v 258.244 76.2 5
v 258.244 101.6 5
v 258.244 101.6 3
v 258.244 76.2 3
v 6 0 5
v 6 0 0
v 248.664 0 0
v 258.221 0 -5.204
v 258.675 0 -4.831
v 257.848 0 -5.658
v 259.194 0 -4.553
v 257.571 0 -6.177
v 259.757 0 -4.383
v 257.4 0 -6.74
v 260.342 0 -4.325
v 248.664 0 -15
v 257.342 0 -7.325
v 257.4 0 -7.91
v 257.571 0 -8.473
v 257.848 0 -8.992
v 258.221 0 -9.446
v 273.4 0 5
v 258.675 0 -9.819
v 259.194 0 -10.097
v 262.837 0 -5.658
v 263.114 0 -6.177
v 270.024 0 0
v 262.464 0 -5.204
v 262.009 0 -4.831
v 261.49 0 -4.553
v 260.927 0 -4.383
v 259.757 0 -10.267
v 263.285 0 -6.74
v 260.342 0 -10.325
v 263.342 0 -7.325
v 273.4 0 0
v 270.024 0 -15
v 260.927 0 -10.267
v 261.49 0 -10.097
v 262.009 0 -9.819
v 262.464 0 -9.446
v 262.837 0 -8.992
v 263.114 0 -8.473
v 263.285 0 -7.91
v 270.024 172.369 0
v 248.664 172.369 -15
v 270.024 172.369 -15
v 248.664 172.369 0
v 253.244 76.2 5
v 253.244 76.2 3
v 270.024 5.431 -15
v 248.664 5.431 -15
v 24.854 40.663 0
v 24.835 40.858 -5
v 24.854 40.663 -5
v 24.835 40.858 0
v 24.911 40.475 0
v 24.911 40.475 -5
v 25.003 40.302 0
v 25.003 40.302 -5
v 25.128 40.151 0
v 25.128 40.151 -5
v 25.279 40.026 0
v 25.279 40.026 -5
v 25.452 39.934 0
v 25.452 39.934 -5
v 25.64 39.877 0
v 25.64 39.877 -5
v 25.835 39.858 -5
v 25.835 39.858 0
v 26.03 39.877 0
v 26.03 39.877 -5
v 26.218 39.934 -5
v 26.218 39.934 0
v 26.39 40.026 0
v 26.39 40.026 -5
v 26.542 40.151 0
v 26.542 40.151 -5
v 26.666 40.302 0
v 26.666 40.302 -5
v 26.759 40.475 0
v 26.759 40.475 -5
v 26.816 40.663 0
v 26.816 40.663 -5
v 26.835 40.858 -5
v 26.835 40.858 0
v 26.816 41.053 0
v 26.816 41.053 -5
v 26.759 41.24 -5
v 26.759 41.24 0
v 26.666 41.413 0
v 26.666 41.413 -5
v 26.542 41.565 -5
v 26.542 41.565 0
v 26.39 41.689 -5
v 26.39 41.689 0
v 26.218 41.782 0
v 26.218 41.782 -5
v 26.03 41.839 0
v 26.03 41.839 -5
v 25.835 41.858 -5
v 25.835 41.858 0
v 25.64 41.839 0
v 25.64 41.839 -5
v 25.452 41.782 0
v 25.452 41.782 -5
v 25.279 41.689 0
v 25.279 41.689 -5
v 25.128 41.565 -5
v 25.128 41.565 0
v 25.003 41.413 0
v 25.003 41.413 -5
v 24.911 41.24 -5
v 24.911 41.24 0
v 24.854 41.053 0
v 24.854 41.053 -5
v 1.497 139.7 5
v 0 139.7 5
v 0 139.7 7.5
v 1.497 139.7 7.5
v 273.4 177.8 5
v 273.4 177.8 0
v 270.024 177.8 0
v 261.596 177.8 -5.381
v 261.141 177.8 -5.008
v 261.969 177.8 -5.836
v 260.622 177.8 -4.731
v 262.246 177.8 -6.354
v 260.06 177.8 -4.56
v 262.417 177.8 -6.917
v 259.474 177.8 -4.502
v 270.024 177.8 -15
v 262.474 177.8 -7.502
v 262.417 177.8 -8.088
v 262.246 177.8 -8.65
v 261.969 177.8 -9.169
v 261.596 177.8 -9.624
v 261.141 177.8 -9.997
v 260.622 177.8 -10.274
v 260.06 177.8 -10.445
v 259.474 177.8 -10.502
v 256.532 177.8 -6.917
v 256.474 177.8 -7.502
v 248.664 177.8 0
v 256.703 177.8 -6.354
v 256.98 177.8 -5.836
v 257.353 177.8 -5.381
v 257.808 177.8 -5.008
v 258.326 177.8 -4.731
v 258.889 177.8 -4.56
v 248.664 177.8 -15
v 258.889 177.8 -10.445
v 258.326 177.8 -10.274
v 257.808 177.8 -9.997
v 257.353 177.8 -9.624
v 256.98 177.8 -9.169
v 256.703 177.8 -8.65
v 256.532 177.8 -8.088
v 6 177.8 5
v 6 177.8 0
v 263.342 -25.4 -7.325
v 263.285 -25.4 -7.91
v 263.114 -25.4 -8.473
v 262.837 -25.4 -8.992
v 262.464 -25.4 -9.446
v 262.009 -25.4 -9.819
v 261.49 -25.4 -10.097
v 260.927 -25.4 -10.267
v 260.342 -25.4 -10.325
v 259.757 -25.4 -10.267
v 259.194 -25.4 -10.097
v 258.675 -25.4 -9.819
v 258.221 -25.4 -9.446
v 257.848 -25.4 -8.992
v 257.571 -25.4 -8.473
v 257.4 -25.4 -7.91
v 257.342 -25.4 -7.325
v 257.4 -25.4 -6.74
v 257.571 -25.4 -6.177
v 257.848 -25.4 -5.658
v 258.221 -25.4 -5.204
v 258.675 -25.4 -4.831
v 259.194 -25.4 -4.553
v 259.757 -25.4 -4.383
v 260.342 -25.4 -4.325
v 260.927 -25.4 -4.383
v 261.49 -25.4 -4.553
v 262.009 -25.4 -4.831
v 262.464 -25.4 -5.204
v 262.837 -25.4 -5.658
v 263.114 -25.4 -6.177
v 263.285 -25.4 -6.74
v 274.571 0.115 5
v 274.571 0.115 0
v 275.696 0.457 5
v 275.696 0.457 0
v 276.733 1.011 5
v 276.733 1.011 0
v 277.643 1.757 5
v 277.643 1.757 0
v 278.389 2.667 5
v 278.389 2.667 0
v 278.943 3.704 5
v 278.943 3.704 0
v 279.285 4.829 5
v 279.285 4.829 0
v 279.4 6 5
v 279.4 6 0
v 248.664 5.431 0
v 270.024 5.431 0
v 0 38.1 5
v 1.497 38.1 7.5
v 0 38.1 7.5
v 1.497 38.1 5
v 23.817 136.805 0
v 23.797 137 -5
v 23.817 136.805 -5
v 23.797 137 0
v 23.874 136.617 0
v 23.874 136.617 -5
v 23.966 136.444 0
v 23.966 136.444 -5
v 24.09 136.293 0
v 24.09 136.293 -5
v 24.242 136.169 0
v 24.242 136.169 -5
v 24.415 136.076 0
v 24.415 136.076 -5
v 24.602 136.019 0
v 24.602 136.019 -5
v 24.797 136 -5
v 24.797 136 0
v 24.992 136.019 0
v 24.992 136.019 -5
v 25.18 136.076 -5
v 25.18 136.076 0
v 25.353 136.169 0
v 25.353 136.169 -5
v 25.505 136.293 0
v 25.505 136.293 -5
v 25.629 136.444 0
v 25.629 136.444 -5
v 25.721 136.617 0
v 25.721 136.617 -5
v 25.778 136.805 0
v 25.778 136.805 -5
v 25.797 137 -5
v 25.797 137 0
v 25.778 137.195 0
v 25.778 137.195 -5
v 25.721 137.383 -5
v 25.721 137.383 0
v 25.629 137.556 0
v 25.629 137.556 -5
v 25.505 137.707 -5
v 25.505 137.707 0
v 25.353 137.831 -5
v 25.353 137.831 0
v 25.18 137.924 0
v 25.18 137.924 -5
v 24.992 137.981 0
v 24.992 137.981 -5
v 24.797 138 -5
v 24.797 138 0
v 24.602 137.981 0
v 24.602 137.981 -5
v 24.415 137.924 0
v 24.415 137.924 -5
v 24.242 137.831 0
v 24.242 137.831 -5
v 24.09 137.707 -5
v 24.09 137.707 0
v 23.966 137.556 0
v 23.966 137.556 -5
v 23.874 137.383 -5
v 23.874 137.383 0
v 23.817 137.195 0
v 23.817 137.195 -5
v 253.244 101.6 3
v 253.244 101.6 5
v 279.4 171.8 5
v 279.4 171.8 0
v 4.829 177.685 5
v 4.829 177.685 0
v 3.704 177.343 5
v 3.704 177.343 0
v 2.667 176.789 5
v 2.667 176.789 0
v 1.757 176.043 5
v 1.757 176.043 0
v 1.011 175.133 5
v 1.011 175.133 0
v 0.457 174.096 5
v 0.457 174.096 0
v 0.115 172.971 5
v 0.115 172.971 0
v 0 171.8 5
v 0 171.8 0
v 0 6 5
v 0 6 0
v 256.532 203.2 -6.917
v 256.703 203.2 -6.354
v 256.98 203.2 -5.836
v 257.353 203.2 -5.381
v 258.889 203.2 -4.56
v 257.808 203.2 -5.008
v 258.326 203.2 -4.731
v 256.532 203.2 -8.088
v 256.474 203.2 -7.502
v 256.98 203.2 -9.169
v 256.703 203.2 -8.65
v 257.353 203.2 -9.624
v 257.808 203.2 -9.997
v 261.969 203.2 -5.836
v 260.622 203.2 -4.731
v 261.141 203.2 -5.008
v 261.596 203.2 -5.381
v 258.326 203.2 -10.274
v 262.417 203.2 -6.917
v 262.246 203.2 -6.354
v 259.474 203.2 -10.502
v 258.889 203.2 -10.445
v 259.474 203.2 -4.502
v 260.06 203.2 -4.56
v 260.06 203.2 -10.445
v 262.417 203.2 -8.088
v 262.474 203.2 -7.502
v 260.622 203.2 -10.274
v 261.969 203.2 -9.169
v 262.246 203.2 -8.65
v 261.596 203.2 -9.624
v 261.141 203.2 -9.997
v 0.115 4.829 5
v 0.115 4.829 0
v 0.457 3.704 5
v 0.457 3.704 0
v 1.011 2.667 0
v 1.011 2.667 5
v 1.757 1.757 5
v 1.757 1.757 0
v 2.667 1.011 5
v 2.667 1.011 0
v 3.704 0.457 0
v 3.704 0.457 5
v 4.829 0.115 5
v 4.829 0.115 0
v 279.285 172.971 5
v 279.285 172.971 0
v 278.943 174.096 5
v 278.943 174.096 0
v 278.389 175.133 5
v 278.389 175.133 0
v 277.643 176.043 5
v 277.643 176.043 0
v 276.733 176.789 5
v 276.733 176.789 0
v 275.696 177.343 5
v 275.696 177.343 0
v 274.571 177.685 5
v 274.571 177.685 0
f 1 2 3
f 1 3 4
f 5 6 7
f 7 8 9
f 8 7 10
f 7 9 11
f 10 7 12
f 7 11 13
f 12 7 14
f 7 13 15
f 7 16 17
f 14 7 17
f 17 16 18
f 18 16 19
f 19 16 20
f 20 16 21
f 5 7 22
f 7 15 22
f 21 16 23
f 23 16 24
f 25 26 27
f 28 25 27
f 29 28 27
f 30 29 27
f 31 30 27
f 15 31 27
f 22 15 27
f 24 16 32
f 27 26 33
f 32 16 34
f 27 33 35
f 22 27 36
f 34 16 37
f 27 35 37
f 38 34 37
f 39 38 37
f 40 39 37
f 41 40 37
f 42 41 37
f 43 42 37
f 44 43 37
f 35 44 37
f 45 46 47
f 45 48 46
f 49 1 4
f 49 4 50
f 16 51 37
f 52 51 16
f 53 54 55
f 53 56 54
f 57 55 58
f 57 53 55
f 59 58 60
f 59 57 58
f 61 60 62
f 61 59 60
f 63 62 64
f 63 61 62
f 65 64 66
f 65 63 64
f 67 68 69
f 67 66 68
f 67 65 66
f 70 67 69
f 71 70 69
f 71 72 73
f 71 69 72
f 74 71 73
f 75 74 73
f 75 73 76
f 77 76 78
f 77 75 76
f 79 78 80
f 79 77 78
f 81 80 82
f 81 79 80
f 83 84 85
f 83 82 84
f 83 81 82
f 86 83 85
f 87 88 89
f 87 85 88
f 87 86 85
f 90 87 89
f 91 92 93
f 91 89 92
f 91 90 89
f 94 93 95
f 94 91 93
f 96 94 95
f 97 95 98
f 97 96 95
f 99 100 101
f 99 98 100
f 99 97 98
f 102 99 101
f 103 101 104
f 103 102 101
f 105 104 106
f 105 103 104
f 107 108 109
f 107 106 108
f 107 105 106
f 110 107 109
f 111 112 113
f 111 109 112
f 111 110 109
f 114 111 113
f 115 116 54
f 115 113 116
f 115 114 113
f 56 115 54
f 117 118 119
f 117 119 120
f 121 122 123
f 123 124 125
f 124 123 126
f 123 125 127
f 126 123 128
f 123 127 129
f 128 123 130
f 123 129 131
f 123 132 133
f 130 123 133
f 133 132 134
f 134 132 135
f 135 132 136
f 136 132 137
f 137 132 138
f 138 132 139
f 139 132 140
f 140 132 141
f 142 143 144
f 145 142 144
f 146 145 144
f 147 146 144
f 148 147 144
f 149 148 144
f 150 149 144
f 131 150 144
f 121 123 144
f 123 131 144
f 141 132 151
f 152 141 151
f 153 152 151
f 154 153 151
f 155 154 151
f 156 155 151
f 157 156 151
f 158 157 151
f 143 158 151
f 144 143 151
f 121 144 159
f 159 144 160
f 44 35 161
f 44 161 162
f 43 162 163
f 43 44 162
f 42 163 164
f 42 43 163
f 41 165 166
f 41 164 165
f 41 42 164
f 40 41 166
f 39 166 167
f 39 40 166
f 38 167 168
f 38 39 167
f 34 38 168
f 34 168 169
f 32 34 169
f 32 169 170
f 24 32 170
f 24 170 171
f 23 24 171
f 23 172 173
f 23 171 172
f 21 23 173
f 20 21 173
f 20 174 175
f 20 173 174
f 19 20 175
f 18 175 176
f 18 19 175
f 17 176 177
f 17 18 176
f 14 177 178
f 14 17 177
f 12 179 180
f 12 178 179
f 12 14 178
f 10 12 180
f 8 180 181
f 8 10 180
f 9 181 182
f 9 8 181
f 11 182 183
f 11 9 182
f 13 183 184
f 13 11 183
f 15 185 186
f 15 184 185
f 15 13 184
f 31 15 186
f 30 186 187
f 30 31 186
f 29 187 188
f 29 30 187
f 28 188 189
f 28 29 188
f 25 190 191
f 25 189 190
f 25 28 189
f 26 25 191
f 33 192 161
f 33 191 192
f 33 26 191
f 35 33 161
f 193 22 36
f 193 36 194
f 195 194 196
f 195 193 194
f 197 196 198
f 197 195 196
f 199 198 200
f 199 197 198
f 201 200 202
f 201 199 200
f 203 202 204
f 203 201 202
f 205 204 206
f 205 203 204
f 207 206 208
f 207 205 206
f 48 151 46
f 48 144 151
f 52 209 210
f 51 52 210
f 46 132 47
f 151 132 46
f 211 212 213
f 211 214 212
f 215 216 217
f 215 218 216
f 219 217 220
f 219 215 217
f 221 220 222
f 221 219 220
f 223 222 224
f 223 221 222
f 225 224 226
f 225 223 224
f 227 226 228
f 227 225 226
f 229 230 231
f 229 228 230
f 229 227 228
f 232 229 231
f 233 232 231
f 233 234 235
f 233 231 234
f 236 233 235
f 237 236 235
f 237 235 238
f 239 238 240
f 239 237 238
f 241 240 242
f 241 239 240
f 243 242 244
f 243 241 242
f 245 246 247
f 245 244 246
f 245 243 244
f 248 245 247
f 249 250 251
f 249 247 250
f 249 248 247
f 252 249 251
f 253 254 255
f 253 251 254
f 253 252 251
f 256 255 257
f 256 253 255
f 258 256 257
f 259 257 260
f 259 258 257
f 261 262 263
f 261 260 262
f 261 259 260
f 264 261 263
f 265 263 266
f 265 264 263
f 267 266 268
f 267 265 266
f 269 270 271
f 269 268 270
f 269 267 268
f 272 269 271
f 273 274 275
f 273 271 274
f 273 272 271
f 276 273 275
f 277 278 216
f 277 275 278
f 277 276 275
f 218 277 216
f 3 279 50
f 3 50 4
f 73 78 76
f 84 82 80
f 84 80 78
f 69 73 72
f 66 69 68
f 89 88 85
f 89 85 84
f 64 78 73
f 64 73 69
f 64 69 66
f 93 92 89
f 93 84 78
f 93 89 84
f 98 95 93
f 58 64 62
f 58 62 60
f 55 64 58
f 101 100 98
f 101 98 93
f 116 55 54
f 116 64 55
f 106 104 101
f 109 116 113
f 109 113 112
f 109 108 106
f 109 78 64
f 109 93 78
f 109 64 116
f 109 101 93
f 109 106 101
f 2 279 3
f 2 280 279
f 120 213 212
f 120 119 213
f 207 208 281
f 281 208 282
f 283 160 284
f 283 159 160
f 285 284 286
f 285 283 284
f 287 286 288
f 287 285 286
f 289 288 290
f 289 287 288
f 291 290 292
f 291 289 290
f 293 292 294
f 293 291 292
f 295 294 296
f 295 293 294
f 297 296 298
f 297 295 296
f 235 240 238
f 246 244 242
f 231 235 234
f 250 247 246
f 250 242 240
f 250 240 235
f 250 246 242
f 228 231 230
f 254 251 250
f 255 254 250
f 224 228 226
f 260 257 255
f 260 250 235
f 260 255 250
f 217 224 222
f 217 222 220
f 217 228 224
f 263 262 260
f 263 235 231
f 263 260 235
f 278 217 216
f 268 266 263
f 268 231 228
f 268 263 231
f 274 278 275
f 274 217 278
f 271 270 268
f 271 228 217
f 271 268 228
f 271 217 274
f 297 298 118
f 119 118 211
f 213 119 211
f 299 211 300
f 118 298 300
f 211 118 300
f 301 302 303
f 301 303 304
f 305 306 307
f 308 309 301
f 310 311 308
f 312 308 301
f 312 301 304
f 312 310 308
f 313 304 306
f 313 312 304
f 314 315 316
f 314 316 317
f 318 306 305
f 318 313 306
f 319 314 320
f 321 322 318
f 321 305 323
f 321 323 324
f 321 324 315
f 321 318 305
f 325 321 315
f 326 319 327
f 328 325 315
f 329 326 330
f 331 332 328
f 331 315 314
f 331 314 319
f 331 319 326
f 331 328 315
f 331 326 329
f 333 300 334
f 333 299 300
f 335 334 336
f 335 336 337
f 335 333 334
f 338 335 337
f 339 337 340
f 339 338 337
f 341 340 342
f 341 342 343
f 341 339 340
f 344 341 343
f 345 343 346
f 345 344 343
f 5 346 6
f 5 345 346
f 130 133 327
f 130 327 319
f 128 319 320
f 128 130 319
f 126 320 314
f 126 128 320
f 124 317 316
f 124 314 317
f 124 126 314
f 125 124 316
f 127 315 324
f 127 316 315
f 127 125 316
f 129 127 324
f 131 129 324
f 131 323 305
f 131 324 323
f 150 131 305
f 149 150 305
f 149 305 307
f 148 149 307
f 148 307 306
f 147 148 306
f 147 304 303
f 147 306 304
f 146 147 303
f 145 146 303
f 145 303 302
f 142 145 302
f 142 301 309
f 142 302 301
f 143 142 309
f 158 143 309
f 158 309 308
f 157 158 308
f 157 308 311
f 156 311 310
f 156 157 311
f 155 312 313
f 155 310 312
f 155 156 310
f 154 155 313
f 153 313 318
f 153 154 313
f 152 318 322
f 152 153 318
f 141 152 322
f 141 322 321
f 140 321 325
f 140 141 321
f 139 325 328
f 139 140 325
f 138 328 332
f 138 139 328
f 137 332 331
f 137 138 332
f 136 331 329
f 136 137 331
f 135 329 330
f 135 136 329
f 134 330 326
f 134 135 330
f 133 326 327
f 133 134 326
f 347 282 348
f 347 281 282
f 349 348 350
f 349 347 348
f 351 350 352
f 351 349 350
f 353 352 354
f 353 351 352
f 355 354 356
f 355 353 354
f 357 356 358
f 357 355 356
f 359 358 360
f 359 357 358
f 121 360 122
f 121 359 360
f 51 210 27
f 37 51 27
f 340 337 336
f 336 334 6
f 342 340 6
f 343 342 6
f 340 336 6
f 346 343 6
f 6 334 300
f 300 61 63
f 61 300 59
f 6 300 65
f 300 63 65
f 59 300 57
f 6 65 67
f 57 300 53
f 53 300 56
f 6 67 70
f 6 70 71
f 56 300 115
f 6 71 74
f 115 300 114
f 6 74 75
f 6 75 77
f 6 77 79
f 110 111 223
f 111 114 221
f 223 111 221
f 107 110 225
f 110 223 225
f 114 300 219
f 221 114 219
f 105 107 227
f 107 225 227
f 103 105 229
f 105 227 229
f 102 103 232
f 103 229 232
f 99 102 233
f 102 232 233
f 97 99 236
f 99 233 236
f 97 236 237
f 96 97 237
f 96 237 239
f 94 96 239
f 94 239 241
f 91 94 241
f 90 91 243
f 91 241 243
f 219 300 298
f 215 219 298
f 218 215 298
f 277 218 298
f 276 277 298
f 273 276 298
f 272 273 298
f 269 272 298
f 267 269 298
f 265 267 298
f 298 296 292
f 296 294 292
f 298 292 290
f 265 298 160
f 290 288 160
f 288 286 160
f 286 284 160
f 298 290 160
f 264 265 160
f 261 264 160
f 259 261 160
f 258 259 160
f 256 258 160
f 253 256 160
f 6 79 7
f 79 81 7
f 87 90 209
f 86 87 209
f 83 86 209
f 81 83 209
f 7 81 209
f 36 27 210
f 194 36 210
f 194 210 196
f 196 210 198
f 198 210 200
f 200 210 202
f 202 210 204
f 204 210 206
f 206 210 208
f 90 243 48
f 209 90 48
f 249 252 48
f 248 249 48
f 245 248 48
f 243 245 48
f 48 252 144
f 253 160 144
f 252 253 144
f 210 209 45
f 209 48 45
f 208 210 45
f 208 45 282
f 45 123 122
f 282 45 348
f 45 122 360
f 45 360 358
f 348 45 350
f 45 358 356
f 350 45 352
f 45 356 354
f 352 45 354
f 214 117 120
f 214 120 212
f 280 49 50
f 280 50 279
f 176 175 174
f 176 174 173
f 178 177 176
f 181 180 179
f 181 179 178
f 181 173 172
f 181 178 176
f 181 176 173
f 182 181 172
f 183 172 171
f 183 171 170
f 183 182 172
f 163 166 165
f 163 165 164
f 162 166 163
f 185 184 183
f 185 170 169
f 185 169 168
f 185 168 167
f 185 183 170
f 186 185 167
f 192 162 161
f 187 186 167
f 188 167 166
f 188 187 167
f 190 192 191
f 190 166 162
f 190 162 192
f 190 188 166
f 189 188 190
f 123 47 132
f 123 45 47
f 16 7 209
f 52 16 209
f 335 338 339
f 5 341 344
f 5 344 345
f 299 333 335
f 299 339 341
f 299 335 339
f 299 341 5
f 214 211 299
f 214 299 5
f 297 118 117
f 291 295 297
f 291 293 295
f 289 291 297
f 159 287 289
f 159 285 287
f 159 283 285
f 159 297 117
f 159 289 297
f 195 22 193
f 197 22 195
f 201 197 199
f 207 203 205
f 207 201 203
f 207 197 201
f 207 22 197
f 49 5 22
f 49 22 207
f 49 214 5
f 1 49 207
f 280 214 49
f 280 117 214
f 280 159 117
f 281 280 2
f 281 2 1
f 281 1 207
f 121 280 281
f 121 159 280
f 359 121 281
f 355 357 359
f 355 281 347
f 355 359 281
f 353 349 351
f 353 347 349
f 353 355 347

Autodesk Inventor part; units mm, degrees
ref_plane "YZ Plane" through (0, 0, 0) normal (1, 0, 0) x (0, 1, 0)
ref_plane "XZ Plane" through (0, 0, 0) normal (0, 1, 0) x (-1, 0, 0)
ref_plane "XY Plane" through (0, 0, 0) normal (0, 0, 1) x (1, 0, 0)
sketch "Sketch1" plane through (0, 0, 0) normal (0, 0, 1) x (1, 0, 0)
  point P0 (0, 0)
sketch "Sketch2" plane through (0, 0, 0) normal (0, 0, 1) x (1, 0, 0)
  line L0 (0, 0) -> (279.4, 0)
  line L1 (279.4, 0) -> (279.4, 177.8)
  line L2 (279.4, 177.8) -> (0, 177.8)
  line L3 (0, 177.8) -> (0, 0)
extrude "Extrusion1" add sketch "Sketch2" along normal blind 5
fillet "Fillet1" radius 6 4 edges at (0, 177.8, 2.5) (0, 0, 2.5) (279.4, 0, 2.5) (279.4, 177.8, 2.5)
sketch "Sketch3" plane through (0, 0, 5) normal (0, 0, 1) x (1, 0, 0)
  line L0 (258.2444, 76.2) -> (253.2444, 76.2)
  line L1 (253.2444, 76.2) -> (253.2444, 101.6)
  line L2 (253.2444, 101.6) -> (258.2444, 101.6)
  line L3 (258.2444, 101.6) -> (258.2444, 76.2)
  line L4 (6, 0) -> (273.4, 0) projected
  point P0 (0, 0)
  dimension "d5" = 5
  dimension "d6" = 25.4
  dimension "d7" = 76.2
extrude "Extrusion2" cut sketch "Sketch3" against normal blind 2
sketch "Sketch4" plane through (0, 0, 5) normal (0, 0, 1) x (1, 0, 0)
  point P0 (0, 0)
sketch "Sketch5" plane through (0, 0, 0) normal (0, 0, -1) x (-1, 0, 0)
  line L0 (-273.4, 177.8) -> (-6, 177.8) projected
  line L1 (-270.0239, 177.8) -> (-248.6645, 177.8)
  line L2 (-248.6645, 177.8) -> (-248.6645, 172.369)
  line L3 (-248.6645, 172.369) -> (-270.0239, 172.369)
  line L4 (-270.0239, 172.369) -> (-270.0239, 177.8)
  line L5 (-6, 0) -> (-273.4, 0) projected
  line L6 (-270.0239, 0) -> (-248.6645, 0)
  line L7 (-248.6645, 0) -> (-248.6645, 5.4307)
  line L8 (-248.6645, 5.4307) -> (-270.0239, 5.4307)
  line L9 (-270.0239, 5.4307) -> (-270.0239, 0)
  point P0 (0, 0)
  dimension "d10" = 5.4307
  dimension "d11" = 5.431
extrude "Extrusion3" add sketch "Sketch5" along normal blind 15
sketch "Sketch6" plane through (6, 177.8, 5) normal (0, 1, 0) x (1, 0, 0)
  point P0 (-6, 5)
sketch "Sketch7" plane through (6, 177.8, 5) normal (0, 1, 0) x (1, 0, 0)
  circle A0 centre (253.4743, 12.5024) radius 3
  point P0 (-6, 5)
  dimension "d14" = 6
sketch "Sketch8" plane through (6, 0, 5) normal (0, -1, 0) x (1, 0, 0)
  circle A0 centre (254.3422, -12.325) radius 3
  point P0 (-6, -5)
  dimension "d15" = 6
extrude "Extrusion4" add sketch "Sketch8" along normal blind 25.4
extrude "Extrusion5" add sketch "Sketch7" along normal blind 25.4
sketch "Sketch9" plane through (0, 0, 5) normal (0, 0, 1) x (1, 0, 0)
  line L0 (0, 171.8) -> (0, 6) projected
  line L1 (0, 139.7) -> (1.4974, 139.7)
  line L2 (1.4974, 139.7) -> (1.4974, 38.1)
  line L3 (1.4974, 38.1) -> (0, 38.1)
  line L4 (0, 38.1) -> (0, 139.7)
  line L5 (6, 0) -> (273.4, 0) projected
  line L6 (273.4, 177.8) -> (6, 177.8) projected
  point P0 (0, 0)
  point P1 (0, 38.1)
  dimension "d20" = 38.1
  dimension "d21" = 38.1
extrude "Extrusion6" add sketch "Sketch9" along normal blind 2.5
sketch "Sketch13" plane through (0, 0, 0) normal (0, 0, -1) x (-1, 0, 0)
  circle A0 centre (-25.8349, 40.8578) radius 1
  point P0 (0, 0)
  dimension "d32" = 2
extrude "Extrusion8" add sketch "Sketch13" along normal blind 5
sketch "Sketch14" plane through (0, 0, 0) normal (0, 0, -1) x (-1, 0, 0)
  circle A0 centre (-24.7974, 137) radius 1
  line L0 (-248.6645, 177.8) -> (-6, 177.8) projected
  line L1 (-1.4974, 139.7) -> (-1.4974, 38.1) projected
  point P0 (0, 0)
  dimension "d35" = 2
  dimension "d36" = 40.8
  dimension "d37" = 23.3
extrude "Extrusion9" add sketch "Sketch14" along normal blind 5
sketch "Sketch15" plane through (0, 0, 0) normal (0, 0, -1) x (-1, 0, 0)
  point P0 (0, 0)
sketch "Sketch16" plane through (0, 0, 5) normal (0, 0, 1) x (1, 0, 0)
  point P0 (0, 0)
properties part number "base"
